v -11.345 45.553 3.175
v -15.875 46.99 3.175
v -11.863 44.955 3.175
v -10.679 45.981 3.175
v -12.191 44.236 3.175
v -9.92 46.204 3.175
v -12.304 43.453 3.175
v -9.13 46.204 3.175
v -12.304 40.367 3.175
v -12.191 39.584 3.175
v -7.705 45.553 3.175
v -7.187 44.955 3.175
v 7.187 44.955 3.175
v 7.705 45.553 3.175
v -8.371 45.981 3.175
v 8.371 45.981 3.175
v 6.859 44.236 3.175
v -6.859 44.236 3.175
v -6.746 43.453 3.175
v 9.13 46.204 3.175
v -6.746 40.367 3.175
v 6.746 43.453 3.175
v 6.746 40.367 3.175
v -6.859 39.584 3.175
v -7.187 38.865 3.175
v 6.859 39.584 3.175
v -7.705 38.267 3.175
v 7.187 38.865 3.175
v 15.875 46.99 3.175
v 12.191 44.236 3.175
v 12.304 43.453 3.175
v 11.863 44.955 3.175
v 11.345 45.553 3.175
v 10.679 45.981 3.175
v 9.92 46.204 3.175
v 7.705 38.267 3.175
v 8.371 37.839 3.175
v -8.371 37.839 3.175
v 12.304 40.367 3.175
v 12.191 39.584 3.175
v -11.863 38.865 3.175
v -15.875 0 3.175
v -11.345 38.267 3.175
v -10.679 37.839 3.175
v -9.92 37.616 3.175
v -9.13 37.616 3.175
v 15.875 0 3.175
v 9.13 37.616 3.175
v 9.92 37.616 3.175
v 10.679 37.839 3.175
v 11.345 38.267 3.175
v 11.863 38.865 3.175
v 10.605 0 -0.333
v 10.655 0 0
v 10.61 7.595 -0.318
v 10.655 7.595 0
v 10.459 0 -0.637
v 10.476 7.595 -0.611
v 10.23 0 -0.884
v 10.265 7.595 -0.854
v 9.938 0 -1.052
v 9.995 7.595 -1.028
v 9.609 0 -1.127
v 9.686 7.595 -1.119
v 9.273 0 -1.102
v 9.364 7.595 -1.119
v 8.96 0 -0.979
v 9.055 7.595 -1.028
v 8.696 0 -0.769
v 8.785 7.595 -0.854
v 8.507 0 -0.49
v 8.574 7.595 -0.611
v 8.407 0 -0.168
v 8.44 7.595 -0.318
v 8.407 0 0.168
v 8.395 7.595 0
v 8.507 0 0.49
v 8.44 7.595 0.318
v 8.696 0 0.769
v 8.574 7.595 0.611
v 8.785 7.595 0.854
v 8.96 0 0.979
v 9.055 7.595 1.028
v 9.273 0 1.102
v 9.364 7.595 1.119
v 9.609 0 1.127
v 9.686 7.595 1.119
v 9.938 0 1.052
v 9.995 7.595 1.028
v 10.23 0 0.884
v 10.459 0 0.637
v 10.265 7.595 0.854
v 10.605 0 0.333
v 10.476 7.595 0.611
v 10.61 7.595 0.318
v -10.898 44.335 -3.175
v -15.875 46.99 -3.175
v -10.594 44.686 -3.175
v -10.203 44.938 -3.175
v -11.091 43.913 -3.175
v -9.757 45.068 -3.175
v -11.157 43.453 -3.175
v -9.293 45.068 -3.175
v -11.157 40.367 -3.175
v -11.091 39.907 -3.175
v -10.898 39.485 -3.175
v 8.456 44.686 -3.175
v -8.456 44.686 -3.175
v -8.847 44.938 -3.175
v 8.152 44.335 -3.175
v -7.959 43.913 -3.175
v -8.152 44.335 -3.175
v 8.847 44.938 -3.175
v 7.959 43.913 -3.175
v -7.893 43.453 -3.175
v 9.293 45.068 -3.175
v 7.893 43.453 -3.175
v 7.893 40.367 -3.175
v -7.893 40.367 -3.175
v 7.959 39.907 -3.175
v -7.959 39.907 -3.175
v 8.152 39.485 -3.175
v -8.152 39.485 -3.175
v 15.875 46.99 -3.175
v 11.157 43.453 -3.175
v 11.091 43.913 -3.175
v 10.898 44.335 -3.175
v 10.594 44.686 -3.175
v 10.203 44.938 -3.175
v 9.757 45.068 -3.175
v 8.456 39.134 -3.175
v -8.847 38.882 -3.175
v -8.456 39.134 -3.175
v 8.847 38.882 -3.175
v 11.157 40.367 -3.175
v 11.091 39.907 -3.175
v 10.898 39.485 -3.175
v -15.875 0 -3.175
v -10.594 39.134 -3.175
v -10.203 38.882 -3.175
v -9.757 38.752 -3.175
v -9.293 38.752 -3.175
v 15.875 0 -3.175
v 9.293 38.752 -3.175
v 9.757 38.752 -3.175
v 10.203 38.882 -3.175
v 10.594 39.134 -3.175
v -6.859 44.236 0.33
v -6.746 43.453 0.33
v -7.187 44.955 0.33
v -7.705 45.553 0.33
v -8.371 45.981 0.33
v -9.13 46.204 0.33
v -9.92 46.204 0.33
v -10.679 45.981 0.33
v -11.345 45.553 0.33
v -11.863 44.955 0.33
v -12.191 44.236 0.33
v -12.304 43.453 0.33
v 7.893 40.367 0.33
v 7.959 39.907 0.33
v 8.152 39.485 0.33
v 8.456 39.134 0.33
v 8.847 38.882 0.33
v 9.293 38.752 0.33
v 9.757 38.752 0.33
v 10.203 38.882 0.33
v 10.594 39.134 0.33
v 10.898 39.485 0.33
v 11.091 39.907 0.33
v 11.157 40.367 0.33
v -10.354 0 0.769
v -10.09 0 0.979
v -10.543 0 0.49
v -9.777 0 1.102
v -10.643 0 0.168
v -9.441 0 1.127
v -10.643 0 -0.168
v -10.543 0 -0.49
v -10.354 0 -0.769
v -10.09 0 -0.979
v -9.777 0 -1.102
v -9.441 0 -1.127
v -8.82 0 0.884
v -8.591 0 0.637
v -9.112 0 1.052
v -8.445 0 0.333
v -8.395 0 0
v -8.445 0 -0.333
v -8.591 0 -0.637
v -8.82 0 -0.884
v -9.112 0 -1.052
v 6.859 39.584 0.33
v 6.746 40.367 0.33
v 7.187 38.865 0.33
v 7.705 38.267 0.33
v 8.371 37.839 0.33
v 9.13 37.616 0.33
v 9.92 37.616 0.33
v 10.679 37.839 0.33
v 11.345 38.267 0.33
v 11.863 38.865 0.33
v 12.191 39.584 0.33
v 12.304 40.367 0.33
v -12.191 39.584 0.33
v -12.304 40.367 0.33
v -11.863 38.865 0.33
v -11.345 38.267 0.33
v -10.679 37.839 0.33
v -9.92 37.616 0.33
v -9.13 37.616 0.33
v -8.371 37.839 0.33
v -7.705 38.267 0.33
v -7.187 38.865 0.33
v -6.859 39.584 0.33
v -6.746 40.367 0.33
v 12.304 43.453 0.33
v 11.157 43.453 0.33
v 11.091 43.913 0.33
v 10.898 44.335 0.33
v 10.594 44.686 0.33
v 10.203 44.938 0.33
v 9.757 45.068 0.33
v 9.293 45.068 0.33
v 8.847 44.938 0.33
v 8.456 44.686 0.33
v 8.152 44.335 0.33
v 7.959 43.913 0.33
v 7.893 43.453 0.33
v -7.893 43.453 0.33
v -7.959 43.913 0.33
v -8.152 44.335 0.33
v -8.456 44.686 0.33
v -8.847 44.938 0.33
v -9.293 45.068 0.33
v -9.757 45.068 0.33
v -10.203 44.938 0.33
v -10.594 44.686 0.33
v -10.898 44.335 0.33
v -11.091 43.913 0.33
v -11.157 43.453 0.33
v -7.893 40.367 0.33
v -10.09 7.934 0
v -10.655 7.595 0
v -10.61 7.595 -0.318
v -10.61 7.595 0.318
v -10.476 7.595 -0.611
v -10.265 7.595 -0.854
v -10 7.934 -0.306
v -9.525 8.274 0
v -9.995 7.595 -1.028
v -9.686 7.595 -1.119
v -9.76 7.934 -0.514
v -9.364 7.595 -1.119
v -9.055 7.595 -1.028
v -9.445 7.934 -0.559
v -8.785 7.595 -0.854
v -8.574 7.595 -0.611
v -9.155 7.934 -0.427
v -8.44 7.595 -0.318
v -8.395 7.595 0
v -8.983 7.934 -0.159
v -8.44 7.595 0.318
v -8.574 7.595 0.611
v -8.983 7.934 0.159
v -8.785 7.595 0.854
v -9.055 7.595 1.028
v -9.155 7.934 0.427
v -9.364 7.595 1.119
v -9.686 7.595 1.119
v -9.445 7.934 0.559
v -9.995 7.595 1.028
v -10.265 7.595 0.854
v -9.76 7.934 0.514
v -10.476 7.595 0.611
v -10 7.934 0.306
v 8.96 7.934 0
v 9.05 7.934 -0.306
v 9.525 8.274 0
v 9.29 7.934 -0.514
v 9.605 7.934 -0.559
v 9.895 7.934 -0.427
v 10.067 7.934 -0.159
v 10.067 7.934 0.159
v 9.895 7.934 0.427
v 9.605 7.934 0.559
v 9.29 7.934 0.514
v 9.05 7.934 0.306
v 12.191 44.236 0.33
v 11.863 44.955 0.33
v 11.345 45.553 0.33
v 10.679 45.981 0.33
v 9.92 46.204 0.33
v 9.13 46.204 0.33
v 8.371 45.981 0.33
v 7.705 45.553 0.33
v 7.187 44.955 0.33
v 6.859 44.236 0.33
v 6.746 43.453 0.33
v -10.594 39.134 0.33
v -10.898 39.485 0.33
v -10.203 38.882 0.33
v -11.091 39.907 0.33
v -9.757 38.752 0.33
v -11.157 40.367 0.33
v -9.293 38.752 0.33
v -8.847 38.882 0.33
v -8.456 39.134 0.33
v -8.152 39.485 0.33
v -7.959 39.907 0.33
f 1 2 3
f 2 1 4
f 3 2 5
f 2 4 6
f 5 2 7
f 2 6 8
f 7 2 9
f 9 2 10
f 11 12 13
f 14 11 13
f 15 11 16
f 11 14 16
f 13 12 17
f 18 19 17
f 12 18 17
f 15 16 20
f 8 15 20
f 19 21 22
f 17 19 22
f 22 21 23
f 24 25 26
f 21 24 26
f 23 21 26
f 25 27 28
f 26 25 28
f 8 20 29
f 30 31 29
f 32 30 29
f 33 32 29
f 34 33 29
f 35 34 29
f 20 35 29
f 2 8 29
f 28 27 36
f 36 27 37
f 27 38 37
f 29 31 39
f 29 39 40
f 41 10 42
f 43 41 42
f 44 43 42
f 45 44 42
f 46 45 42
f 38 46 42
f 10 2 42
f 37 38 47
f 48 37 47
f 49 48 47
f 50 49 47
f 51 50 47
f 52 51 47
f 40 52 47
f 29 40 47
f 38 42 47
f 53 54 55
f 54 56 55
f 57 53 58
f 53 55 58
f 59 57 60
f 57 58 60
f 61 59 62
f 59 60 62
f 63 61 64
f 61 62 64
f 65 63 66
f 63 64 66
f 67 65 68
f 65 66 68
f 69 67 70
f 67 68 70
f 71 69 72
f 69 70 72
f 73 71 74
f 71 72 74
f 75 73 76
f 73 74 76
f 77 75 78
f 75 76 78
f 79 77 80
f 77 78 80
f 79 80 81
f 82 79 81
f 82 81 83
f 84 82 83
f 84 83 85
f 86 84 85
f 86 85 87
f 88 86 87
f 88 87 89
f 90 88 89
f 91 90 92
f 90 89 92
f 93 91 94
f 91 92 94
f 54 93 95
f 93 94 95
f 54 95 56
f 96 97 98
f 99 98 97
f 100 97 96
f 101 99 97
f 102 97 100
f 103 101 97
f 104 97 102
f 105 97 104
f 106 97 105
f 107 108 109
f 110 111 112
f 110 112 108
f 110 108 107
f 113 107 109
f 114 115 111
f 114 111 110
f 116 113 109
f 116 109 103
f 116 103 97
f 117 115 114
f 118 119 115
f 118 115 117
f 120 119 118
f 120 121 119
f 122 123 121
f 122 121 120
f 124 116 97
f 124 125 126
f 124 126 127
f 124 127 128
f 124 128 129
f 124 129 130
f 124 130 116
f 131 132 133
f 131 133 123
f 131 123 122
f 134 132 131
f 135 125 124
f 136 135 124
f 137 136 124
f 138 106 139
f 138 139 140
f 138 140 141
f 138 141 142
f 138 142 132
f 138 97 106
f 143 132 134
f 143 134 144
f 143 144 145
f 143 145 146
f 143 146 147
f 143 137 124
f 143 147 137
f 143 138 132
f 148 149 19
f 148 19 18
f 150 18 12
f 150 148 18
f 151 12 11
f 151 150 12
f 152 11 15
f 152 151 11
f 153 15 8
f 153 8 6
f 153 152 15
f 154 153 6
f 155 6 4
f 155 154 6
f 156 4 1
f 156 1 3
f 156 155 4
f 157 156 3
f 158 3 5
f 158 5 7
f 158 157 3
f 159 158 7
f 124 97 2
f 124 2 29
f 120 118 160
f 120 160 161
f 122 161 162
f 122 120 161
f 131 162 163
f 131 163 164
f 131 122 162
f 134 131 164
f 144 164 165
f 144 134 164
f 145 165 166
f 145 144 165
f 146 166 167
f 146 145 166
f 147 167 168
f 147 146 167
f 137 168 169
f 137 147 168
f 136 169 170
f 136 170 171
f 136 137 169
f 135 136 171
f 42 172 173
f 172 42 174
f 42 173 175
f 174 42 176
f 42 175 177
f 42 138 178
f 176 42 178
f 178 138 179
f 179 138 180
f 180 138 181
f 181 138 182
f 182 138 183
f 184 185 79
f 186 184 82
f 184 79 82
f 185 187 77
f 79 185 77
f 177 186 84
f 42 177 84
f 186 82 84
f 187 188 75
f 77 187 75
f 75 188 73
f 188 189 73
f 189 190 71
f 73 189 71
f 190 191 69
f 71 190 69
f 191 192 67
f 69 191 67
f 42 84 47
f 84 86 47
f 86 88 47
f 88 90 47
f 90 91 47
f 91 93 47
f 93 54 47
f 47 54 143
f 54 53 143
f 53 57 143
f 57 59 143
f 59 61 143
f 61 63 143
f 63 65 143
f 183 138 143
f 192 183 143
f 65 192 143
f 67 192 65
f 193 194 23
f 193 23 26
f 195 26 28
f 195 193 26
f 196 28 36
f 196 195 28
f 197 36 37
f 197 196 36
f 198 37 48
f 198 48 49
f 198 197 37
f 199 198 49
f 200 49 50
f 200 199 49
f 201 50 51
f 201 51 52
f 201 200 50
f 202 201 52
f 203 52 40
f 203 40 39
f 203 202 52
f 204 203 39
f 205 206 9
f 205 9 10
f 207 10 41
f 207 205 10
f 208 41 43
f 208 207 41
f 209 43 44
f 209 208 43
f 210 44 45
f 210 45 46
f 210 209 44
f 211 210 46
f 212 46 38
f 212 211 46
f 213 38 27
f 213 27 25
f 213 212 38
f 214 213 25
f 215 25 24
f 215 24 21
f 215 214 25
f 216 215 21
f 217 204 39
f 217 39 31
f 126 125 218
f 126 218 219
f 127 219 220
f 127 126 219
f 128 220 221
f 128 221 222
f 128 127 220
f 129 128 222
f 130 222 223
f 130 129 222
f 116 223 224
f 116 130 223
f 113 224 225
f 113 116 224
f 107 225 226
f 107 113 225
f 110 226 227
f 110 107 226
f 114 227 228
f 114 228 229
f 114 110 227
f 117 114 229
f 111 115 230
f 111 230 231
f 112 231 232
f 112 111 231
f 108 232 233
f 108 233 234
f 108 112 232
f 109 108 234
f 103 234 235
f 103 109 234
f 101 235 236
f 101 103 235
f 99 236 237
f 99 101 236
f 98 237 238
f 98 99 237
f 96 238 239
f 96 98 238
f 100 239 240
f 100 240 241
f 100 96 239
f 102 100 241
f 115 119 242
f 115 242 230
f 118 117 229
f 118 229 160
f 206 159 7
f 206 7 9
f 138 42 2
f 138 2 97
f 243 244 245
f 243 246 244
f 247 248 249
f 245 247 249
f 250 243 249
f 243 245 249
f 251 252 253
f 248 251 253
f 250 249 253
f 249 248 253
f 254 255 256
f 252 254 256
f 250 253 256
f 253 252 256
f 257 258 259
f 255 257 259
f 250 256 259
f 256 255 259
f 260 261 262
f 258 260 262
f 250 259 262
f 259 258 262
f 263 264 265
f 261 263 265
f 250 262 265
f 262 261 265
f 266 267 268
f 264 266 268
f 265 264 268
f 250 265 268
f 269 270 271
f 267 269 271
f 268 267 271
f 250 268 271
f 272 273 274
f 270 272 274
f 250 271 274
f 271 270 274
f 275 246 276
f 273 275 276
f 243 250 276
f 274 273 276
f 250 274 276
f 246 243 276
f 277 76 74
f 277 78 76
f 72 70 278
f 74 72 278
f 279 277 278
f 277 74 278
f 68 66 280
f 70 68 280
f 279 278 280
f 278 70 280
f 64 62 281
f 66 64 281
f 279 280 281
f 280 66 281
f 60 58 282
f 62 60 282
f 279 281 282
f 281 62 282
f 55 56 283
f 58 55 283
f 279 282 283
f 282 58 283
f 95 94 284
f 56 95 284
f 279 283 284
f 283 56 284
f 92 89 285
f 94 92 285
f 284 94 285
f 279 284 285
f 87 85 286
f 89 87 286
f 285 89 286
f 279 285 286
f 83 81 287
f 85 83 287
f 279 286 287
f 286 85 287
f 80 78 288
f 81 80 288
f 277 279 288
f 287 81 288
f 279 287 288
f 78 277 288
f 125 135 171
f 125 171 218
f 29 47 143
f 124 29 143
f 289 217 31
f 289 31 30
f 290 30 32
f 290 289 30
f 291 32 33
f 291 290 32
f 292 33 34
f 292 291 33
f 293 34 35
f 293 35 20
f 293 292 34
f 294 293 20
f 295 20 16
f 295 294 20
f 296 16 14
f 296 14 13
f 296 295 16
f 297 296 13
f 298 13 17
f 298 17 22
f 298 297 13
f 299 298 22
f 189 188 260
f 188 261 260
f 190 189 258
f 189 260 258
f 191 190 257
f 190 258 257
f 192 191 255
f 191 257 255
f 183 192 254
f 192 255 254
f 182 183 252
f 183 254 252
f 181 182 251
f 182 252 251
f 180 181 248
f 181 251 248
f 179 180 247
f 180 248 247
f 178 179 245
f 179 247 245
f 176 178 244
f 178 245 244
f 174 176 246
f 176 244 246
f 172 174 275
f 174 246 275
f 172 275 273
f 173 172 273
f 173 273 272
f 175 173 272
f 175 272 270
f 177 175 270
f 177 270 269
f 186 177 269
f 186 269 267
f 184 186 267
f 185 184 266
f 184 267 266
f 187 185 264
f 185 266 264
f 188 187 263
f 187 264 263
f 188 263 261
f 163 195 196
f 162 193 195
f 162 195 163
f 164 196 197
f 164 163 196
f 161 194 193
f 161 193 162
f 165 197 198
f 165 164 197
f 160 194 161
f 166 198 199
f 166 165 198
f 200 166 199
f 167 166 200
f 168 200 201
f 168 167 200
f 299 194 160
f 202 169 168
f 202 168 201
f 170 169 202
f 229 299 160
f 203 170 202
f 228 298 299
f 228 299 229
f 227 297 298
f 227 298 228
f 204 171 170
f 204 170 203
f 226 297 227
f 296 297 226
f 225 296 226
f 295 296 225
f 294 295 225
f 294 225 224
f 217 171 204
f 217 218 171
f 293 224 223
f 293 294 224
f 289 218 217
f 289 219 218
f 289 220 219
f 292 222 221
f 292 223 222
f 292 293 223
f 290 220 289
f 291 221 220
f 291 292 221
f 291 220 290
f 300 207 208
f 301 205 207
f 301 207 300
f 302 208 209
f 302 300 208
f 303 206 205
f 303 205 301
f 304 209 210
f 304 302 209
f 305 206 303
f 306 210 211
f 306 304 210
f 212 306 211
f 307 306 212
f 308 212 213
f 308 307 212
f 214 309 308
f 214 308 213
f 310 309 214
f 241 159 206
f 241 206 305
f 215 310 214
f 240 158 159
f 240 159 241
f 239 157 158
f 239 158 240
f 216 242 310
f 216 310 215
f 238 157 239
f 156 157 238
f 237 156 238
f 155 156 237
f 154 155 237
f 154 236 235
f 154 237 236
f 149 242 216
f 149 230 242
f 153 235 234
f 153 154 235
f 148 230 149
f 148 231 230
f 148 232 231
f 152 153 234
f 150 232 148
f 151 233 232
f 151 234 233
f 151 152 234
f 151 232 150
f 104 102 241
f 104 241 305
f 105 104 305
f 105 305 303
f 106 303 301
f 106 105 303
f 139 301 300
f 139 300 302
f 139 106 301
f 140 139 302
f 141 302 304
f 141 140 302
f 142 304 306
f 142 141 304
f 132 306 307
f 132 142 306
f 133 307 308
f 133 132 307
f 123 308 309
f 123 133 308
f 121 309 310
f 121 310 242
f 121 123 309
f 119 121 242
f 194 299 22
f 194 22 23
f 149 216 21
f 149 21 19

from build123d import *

# Parameters (mm, degrees)
SKETCH1_W                                     = 31.75
SKETCH1_H                                     = 6.35
BOSS_EXTRUDE1_DEPTH                           = 46.99
F_4_40_TAPPED_HOLE1_D                         = 2.2606
F_4_40_TAPPED_HOLE1_DEPTH                     = 7.5946
F_4_40_TAPPED_HOLE1_TIP                       = 0.679152758
CBORE_START                                   = 0.3302
CBORE_SLOT_FOR_4_SOCKET_HEAD_CAP_SCREW1_DEPTH = 2.8448
CBORE_START_2                                 = -3.175
CBORE_SLOT_FOR_4_SOCKET_HEAD_CAP_SC_3_DEPTH   = 3.5052


# Read off the part's stored shape, not the designer's step: CBORE SLOT for #4 Socket Head Cap Screw1
with BuildPart() as part:
    # Sketch1 → Boss-Extrude1 (new body)
    with BuildSketch(Plane(origin=(0, 0, 0), x_dir=(1, 0, 0), z_dir=(0, 1, 0))):
        Rectangle(SKETCH1_W, SKETCH1_H)
    extrude(amount=BOSS_EXTRUDE1_DEPTH)

    # #4-40 Tapped Hole1
    with Locations(Plane(origin=(0, 0, 0), x_dir=(-1, 0, 0), z_dir=(0, -1, 0))):
        with Locations((9.525, 0), (-9.525, 0)):
            Hole(F_4_40_TAPPED_HOLE1_D / 2, depth=F_4_40_TAPPED_HOLE1_DEPTH)
            with Locations((0, 0, -(F_4_40_TAPPED_HOLE1_DEPTH + F_4_40_TAPPED_HOLE1_TIP / 2))):  # 118° drill point
                Cone(0, F_4_40_TAPPED_HOLE1_D / 2, F_4_40_TAPPED_HOLE1_TIP, mode=Mode.SUBTRACT)

    # CBORE SLOT for _4 Socket Head Cap Sc 2 → CBORE SLOT for #4 Socket Head Cap Screw1 (cut)
    with BuildSketch(Plane.XY.offset(CBORE_START)):
        with BuildLine():
            Line((-6.74624, 40.36695), (-6.74624, 43.45305))
            ThreePointArc((-6.74624, 43.45305), (-9.525, 46.23181), (-12.30376, 43.45305))
            Line((-12.30376, 43.45305), (-12.30376, 40.36695))
            ThreePointArc((-12.30376, 40.36695), (-9.525, 37.58819), (-6.74624, 40.36695))
        make_face()
        with BuildLine():
            Line((12.30376, 40.36695), (12.30376, 43.45305))
            ThreePointArc((12.30376, 43.45305), (9.525, 46.23181), (6.74624, 43.45305))
            Line((6.74624, 43.45305), (6.74624, 40.36695))
            ThreePointArc((6.74624, 40.36695), (9.525, 37.58819), (12.30376, 40.36695))
        make_face()
    extrude(amount=CBORE_SLOT_FOR_4_SOCKET_HEAD_CAP_SCREW1_DEPTH, mode=Mode.SUBTRACT)

    # CBORE SLOT for _4 Socket Head Cap Sc 3 o → CBORE SLOT for _4 Socket Head Cap Sc 3 (cut)
    with BuildSketch(Plane.XY.offset(CBORE_START_2)):
        with BuildLine():
            ThreePointArc((-7.89305, 43.45305), (-9.525, 45.085), (-11.15695, 43.45305))
            Line((-11.15695, 43.45305), (-11.15695, 40.36695))
            ThreePointArc((-11.15695, 40.36695), (-9.525, 38.735), (-7.89305, 40.36695))
            Line((-7.89305, 40.36695), (-7.89305, 43.45305))
        make_face()
        with BuildLine():
            Line((7.89305, 43.45305), (7.89305, 40.36695))
            ThreePointArc((7.89305, 40.36695), (9.525, 38.735), (11.15695, 40.36695))
            Line((11.15695, 40.36695), (11.15695, 43.45305))
            ThreePointArc((11.15695, 43.45305), (9.525, 45.085), (7.89305, 43.45305))
        make_face()
    extrude(amount=CBORE_SLOT_FOR_4_SOCKET_HEAD_CAP_SC_3_DEPTH, mode=Mode.SUBTRACT)


solid = part.part
